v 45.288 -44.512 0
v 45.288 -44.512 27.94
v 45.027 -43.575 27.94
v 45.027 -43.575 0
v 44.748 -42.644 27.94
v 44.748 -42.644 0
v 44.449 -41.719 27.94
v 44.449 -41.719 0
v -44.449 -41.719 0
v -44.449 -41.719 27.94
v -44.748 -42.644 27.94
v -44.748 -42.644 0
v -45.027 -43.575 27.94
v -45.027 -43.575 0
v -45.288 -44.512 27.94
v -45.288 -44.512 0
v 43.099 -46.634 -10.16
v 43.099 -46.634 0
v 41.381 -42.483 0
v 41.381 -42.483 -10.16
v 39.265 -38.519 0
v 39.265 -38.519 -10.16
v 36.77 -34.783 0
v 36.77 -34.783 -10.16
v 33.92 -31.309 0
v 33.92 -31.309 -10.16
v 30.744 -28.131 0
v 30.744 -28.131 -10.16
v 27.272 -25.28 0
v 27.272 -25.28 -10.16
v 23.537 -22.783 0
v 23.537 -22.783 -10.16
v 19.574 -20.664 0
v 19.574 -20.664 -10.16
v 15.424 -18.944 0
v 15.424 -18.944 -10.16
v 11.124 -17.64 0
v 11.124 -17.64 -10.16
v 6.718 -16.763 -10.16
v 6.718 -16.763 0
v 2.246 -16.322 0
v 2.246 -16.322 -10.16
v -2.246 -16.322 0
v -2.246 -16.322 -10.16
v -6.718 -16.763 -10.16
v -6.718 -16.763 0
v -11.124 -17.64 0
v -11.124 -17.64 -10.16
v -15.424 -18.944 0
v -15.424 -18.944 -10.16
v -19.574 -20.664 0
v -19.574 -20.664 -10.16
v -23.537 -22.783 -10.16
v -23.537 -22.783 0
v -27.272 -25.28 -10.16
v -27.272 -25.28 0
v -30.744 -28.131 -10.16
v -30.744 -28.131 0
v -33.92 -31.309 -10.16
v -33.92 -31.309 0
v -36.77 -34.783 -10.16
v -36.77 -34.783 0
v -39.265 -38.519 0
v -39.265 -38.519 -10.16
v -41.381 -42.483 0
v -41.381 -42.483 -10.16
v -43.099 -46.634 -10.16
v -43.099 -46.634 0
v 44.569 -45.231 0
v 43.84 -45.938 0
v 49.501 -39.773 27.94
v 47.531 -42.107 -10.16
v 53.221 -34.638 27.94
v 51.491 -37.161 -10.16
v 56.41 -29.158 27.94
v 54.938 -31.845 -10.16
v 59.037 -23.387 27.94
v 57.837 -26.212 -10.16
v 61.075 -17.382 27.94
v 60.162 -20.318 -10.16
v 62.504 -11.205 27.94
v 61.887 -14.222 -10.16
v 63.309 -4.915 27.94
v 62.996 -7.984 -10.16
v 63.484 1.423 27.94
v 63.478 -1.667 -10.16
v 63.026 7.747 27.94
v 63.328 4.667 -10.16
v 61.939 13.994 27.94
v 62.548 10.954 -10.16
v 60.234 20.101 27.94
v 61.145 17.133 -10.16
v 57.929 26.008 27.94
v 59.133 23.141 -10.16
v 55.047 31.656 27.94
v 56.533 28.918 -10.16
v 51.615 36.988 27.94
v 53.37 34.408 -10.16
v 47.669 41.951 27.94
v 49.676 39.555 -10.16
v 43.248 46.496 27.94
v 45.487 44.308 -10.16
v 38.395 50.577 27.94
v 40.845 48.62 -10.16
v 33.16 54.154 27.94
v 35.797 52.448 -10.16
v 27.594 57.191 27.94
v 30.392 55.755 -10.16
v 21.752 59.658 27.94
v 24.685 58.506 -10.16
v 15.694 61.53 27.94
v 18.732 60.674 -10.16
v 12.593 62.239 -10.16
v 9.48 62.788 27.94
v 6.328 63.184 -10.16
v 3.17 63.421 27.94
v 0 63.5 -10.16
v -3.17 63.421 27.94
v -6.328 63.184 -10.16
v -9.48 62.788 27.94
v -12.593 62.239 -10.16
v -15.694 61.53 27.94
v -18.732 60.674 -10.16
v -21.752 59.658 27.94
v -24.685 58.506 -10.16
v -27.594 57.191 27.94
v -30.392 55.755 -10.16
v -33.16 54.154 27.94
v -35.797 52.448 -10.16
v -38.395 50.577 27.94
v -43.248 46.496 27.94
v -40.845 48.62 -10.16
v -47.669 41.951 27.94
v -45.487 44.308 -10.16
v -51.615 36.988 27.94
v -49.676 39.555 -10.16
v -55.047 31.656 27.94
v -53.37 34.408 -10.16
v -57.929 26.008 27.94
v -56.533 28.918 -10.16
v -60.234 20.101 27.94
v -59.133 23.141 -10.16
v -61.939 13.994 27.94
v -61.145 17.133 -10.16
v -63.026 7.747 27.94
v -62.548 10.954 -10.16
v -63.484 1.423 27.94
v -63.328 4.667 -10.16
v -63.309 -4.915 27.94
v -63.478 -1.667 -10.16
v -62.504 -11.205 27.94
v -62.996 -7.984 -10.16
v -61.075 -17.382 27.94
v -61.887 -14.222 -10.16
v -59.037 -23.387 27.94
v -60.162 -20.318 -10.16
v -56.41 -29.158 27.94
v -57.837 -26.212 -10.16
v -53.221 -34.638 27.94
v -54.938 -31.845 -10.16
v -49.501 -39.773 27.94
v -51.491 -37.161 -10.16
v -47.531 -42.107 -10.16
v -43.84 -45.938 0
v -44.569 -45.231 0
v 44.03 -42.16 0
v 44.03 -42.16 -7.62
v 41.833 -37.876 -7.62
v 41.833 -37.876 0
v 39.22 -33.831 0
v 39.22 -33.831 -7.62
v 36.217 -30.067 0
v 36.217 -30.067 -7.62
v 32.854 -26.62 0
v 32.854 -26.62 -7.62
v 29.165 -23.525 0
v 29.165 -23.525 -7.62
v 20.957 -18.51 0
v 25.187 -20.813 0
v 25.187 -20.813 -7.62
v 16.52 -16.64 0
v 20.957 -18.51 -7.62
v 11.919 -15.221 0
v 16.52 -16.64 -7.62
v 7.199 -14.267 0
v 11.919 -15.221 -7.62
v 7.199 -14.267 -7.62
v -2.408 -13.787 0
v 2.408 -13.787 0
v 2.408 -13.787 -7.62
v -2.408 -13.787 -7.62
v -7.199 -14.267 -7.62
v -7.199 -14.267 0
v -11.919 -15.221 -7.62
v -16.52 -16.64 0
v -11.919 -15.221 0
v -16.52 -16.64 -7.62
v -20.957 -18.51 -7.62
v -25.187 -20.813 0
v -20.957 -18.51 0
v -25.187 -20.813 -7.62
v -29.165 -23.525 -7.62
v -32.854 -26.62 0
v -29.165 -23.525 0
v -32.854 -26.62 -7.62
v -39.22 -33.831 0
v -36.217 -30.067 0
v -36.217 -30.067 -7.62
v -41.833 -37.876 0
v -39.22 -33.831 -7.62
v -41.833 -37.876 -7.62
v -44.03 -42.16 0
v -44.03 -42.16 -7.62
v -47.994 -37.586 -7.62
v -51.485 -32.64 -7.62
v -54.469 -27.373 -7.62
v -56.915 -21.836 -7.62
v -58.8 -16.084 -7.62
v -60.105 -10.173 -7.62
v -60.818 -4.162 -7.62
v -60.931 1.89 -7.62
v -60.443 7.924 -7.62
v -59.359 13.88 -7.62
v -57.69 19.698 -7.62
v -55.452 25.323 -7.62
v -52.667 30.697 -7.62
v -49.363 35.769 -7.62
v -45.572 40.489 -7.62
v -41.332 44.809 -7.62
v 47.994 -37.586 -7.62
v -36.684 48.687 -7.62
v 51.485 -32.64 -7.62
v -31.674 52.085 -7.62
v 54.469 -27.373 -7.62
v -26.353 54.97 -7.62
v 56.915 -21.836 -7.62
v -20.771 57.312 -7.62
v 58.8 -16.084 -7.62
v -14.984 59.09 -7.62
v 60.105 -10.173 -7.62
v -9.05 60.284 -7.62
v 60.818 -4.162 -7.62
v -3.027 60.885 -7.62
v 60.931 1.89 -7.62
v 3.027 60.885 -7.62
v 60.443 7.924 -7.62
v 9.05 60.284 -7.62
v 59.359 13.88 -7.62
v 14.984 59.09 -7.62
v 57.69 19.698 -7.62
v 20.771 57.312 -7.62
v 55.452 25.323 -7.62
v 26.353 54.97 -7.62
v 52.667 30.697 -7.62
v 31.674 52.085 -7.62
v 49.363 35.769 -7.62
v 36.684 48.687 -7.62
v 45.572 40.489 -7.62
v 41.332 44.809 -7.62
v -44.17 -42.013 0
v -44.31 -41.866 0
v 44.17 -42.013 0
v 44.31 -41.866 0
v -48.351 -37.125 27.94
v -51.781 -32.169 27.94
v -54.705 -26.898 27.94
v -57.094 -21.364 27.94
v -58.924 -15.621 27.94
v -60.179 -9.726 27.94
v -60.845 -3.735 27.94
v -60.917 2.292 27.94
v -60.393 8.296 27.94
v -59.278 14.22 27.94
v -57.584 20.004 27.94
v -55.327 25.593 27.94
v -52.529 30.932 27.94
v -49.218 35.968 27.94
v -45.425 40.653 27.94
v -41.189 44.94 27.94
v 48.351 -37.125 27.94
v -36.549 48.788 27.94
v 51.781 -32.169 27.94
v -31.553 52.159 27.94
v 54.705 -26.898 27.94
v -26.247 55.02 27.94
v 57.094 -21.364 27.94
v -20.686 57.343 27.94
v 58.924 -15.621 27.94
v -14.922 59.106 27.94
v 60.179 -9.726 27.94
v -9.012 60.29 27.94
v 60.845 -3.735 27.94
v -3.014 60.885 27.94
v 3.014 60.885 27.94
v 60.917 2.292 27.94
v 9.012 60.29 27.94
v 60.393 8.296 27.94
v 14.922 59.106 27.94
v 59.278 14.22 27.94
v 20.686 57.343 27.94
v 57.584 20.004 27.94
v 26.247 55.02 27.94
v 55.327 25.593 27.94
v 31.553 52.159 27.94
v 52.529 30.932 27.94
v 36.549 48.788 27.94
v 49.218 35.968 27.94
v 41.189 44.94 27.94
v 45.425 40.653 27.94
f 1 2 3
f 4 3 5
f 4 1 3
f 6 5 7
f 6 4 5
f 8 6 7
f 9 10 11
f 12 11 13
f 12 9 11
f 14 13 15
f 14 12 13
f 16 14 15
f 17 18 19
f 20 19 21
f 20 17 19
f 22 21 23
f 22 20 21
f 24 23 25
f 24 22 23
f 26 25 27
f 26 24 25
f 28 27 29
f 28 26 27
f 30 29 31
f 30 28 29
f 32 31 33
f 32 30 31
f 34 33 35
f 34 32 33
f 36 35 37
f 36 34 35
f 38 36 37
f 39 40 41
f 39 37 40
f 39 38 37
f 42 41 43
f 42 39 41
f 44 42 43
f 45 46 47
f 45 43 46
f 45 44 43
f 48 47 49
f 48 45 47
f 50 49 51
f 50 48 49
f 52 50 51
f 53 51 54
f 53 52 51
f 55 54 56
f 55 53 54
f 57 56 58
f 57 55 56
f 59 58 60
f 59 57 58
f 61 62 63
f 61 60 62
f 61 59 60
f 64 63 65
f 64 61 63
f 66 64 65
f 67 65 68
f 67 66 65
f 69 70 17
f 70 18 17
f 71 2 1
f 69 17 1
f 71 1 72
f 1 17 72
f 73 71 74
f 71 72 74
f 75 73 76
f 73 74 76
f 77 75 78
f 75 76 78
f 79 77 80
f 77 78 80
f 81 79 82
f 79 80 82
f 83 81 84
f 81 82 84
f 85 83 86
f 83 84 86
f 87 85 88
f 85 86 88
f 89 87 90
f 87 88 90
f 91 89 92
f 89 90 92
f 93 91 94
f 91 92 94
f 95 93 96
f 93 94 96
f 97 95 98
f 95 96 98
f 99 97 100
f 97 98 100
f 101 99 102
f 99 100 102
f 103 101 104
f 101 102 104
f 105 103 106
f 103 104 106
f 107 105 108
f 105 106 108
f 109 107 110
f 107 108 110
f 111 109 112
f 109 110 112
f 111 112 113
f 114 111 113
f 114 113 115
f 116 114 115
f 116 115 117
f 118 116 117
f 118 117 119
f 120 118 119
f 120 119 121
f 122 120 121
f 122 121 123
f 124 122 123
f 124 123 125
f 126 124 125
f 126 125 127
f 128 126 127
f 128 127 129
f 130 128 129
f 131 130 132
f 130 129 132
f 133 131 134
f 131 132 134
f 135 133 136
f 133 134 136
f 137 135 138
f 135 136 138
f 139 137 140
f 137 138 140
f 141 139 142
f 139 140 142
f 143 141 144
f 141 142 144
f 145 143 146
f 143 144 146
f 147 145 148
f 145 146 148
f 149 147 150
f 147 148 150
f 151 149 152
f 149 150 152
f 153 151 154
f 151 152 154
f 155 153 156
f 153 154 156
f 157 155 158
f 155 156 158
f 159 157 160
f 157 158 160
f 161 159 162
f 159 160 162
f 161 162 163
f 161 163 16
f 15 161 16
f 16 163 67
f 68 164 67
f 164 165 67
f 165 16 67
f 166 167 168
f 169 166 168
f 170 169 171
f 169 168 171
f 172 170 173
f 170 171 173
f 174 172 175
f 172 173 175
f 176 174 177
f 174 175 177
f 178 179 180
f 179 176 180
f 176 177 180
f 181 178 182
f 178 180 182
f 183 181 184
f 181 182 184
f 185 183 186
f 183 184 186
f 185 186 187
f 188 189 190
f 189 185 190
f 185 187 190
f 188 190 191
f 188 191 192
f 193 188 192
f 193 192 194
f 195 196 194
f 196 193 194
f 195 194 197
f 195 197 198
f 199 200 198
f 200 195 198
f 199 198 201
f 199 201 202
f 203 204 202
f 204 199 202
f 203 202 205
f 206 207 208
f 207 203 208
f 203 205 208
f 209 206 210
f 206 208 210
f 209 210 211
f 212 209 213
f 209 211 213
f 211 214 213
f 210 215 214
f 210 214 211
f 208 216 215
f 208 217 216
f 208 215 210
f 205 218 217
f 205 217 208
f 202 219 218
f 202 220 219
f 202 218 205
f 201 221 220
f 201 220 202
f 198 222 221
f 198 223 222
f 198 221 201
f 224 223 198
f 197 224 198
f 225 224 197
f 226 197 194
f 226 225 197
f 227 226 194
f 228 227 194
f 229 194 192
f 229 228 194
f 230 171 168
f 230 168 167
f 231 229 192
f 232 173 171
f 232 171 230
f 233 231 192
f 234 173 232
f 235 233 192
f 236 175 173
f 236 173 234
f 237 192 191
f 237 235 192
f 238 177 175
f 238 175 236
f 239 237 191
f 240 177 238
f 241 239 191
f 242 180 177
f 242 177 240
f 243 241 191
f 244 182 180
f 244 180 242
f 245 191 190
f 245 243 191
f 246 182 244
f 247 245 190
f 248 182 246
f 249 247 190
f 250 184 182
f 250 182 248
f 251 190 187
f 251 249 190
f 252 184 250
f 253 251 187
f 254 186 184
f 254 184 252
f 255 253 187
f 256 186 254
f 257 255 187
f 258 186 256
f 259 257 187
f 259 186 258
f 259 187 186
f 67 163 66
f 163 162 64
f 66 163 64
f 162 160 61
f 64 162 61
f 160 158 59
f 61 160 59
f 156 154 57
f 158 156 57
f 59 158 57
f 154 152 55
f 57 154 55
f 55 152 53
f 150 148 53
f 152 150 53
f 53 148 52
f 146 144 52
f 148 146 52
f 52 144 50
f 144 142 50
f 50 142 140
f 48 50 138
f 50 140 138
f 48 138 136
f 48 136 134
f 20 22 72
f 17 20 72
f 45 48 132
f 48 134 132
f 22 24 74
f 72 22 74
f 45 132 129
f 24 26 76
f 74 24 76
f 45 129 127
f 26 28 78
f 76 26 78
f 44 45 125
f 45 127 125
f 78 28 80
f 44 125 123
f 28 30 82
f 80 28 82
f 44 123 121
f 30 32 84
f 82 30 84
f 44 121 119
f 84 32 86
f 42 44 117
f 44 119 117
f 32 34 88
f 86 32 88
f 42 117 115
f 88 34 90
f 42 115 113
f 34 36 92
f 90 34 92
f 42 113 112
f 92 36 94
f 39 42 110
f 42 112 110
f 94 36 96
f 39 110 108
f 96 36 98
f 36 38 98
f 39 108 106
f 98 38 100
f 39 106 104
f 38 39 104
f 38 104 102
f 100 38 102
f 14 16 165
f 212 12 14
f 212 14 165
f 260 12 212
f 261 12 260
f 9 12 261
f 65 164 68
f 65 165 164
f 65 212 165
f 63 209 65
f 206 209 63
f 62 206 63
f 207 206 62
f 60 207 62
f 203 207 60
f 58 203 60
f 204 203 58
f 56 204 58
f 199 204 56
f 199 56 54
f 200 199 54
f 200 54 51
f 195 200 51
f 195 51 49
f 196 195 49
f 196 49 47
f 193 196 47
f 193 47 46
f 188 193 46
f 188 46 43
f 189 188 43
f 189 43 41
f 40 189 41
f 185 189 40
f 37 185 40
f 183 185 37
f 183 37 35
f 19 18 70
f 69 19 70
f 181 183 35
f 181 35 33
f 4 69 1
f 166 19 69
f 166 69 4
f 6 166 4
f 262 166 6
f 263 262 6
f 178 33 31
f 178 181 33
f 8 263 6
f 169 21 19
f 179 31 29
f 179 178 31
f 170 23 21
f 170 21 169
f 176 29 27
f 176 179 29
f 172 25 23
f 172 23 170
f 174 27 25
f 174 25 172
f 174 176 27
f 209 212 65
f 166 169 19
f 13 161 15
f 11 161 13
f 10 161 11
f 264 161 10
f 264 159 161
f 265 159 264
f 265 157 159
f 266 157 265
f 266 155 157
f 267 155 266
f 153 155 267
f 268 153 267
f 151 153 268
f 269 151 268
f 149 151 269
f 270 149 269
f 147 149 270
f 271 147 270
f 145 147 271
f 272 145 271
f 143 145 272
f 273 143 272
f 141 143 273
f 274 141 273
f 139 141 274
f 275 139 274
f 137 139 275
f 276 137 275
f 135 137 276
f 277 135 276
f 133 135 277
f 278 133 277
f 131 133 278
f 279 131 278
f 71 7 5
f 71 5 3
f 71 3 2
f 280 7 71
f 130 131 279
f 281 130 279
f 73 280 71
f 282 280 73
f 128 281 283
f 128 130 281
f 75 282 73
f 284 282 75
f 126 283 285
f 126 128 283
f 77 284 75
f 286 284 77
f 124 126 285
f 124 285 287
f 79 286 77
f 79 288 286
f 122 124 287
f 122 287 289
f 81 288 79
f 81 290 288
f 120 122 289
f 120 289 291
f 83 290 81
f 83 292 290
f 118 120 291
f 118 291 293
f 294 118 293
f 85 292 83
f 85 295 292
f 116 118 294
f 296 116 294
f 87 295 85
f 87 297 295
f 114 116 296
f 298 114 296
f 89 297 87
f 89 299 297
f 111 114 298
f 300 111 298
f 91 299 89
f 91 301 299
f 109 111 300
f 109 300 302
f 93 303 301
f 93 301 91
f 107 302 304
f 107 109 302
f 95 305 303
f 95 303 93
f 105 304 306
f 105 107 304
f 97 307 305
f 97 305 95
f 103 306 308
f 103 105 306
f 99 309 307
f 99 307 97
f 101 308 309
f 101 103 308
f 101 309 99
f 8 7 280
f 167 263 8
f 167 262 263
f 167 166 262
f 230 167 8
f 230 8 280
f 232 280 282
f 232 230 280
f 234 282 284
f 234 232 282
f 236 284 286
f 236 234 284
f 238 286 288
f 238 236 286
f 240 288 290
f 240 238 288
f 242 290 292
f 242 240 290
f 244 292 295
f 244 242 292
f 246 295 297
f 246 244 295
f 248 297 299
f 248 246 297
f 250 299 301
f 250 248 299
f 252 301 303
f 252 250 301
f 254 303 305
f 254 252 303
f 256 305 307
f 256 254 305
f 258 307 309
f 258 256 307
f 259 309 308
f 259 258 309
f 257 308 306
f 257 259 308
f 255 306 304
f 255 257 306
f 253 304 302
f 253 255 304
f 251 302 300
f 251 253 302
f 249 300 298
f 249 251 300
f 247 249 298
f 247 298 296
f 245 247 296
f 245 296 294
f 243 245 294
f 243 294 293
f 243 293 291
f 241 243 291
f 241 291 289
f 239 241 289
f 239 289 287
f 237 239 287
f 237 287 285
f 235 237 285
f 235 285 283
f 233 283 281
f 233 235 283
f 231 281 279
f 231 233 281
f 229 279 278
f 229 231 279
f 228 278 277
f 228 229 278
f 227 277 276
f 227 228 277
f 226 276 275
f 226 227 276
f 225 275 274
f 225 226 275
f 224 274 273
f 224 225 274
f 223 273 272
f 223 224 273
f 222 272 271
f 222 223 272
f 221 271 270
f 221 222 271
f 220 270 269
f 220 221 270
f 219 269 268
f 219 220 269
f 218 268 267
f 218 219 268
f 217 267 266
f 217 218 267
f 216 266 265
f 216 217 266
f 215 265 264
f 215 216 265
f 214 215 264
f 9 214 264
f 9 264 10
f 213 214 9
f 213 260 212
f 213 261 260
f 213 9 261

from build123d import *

# Parameters (mm, degrees)
F0_R     = 63.5
F1_DEPTH = 2.54
F2_R     = 45.7677355117
F3_DEPTH = 25.4
F4_DEPTH = 12.7
F5_DEPTH = 25.4
F6_T     = -2.54
F8_R     = 46.8709431216
F9_DEPTH = 177.8


with BuildPart() as f1:
    # F0 (on Top) → F1 (new body)
    with BuildSketch(Plane.XY):
        Circle(F0_R)
    extrude(amount=F1_DEPTH)

    # F2 (on Top) → F3 (cut)
    with BuildSketch(Plane.XY):
        with Locations((0, -62.0349124074)):
            Circle(F2_R)
    extrude(amount=F3_DEPTH, mode=Mode.SUBTRACT)

    # F1_face (on face) → F4 (join)
    with BuildSketch(Plane(origin=(0, 12.1231613089, 2.54), x_dir=(1, 0, 0), z_dir=(0, 0, 1))):
        with BuildLine():
            ThreePointArc((-43.0987599006, -58.7573429253), (0, -28.3903382046), (43.0987599006, -58.7573429253))
            ThreePointArc((43.0987599006, -58.7573429253), (0, 51.3768386911), (-43.0987599006, -58.7573429253))
        make_face()
    extrude(amount=-F4_DEPTH)

    # F1_face (on face) → F5 (join)
    with BuildSketch(Plane(origin=(0, 12.1231613089, 2.54), x_dir=(1, 0, 0), z_dir=(0, 0, 1))):
        with BuildLine():
            ThreePointArc((-43.0987599006, -58.7573429253), (0, -28.3903382046), (43.0987599006, -58.7573429253))
            ThreePointArc((43.0987599006, -58.7573429253), (0, 51.3768386911), (-43.0987599006, -58.7573429253))
        make_face()
    extrude(amount=F5_DEPTH)

    # F6
    f6_openings = [f1.faces().sort_by_distance(p)[0] for p in [
        (0, 12.123161, 27.94),
    ]]
    offset(amount=F6_T, openings=f6_openings)

    # F8 (on face) → F9 (cut)
    with BuildSketch(Plane.XY):
        with Locations((0, -56.5915703773)):
            Circle(F8_R)
    extrude(amount=F9_DEPTH, mode=Mode.SUBTRACT)


solid = f1.part
